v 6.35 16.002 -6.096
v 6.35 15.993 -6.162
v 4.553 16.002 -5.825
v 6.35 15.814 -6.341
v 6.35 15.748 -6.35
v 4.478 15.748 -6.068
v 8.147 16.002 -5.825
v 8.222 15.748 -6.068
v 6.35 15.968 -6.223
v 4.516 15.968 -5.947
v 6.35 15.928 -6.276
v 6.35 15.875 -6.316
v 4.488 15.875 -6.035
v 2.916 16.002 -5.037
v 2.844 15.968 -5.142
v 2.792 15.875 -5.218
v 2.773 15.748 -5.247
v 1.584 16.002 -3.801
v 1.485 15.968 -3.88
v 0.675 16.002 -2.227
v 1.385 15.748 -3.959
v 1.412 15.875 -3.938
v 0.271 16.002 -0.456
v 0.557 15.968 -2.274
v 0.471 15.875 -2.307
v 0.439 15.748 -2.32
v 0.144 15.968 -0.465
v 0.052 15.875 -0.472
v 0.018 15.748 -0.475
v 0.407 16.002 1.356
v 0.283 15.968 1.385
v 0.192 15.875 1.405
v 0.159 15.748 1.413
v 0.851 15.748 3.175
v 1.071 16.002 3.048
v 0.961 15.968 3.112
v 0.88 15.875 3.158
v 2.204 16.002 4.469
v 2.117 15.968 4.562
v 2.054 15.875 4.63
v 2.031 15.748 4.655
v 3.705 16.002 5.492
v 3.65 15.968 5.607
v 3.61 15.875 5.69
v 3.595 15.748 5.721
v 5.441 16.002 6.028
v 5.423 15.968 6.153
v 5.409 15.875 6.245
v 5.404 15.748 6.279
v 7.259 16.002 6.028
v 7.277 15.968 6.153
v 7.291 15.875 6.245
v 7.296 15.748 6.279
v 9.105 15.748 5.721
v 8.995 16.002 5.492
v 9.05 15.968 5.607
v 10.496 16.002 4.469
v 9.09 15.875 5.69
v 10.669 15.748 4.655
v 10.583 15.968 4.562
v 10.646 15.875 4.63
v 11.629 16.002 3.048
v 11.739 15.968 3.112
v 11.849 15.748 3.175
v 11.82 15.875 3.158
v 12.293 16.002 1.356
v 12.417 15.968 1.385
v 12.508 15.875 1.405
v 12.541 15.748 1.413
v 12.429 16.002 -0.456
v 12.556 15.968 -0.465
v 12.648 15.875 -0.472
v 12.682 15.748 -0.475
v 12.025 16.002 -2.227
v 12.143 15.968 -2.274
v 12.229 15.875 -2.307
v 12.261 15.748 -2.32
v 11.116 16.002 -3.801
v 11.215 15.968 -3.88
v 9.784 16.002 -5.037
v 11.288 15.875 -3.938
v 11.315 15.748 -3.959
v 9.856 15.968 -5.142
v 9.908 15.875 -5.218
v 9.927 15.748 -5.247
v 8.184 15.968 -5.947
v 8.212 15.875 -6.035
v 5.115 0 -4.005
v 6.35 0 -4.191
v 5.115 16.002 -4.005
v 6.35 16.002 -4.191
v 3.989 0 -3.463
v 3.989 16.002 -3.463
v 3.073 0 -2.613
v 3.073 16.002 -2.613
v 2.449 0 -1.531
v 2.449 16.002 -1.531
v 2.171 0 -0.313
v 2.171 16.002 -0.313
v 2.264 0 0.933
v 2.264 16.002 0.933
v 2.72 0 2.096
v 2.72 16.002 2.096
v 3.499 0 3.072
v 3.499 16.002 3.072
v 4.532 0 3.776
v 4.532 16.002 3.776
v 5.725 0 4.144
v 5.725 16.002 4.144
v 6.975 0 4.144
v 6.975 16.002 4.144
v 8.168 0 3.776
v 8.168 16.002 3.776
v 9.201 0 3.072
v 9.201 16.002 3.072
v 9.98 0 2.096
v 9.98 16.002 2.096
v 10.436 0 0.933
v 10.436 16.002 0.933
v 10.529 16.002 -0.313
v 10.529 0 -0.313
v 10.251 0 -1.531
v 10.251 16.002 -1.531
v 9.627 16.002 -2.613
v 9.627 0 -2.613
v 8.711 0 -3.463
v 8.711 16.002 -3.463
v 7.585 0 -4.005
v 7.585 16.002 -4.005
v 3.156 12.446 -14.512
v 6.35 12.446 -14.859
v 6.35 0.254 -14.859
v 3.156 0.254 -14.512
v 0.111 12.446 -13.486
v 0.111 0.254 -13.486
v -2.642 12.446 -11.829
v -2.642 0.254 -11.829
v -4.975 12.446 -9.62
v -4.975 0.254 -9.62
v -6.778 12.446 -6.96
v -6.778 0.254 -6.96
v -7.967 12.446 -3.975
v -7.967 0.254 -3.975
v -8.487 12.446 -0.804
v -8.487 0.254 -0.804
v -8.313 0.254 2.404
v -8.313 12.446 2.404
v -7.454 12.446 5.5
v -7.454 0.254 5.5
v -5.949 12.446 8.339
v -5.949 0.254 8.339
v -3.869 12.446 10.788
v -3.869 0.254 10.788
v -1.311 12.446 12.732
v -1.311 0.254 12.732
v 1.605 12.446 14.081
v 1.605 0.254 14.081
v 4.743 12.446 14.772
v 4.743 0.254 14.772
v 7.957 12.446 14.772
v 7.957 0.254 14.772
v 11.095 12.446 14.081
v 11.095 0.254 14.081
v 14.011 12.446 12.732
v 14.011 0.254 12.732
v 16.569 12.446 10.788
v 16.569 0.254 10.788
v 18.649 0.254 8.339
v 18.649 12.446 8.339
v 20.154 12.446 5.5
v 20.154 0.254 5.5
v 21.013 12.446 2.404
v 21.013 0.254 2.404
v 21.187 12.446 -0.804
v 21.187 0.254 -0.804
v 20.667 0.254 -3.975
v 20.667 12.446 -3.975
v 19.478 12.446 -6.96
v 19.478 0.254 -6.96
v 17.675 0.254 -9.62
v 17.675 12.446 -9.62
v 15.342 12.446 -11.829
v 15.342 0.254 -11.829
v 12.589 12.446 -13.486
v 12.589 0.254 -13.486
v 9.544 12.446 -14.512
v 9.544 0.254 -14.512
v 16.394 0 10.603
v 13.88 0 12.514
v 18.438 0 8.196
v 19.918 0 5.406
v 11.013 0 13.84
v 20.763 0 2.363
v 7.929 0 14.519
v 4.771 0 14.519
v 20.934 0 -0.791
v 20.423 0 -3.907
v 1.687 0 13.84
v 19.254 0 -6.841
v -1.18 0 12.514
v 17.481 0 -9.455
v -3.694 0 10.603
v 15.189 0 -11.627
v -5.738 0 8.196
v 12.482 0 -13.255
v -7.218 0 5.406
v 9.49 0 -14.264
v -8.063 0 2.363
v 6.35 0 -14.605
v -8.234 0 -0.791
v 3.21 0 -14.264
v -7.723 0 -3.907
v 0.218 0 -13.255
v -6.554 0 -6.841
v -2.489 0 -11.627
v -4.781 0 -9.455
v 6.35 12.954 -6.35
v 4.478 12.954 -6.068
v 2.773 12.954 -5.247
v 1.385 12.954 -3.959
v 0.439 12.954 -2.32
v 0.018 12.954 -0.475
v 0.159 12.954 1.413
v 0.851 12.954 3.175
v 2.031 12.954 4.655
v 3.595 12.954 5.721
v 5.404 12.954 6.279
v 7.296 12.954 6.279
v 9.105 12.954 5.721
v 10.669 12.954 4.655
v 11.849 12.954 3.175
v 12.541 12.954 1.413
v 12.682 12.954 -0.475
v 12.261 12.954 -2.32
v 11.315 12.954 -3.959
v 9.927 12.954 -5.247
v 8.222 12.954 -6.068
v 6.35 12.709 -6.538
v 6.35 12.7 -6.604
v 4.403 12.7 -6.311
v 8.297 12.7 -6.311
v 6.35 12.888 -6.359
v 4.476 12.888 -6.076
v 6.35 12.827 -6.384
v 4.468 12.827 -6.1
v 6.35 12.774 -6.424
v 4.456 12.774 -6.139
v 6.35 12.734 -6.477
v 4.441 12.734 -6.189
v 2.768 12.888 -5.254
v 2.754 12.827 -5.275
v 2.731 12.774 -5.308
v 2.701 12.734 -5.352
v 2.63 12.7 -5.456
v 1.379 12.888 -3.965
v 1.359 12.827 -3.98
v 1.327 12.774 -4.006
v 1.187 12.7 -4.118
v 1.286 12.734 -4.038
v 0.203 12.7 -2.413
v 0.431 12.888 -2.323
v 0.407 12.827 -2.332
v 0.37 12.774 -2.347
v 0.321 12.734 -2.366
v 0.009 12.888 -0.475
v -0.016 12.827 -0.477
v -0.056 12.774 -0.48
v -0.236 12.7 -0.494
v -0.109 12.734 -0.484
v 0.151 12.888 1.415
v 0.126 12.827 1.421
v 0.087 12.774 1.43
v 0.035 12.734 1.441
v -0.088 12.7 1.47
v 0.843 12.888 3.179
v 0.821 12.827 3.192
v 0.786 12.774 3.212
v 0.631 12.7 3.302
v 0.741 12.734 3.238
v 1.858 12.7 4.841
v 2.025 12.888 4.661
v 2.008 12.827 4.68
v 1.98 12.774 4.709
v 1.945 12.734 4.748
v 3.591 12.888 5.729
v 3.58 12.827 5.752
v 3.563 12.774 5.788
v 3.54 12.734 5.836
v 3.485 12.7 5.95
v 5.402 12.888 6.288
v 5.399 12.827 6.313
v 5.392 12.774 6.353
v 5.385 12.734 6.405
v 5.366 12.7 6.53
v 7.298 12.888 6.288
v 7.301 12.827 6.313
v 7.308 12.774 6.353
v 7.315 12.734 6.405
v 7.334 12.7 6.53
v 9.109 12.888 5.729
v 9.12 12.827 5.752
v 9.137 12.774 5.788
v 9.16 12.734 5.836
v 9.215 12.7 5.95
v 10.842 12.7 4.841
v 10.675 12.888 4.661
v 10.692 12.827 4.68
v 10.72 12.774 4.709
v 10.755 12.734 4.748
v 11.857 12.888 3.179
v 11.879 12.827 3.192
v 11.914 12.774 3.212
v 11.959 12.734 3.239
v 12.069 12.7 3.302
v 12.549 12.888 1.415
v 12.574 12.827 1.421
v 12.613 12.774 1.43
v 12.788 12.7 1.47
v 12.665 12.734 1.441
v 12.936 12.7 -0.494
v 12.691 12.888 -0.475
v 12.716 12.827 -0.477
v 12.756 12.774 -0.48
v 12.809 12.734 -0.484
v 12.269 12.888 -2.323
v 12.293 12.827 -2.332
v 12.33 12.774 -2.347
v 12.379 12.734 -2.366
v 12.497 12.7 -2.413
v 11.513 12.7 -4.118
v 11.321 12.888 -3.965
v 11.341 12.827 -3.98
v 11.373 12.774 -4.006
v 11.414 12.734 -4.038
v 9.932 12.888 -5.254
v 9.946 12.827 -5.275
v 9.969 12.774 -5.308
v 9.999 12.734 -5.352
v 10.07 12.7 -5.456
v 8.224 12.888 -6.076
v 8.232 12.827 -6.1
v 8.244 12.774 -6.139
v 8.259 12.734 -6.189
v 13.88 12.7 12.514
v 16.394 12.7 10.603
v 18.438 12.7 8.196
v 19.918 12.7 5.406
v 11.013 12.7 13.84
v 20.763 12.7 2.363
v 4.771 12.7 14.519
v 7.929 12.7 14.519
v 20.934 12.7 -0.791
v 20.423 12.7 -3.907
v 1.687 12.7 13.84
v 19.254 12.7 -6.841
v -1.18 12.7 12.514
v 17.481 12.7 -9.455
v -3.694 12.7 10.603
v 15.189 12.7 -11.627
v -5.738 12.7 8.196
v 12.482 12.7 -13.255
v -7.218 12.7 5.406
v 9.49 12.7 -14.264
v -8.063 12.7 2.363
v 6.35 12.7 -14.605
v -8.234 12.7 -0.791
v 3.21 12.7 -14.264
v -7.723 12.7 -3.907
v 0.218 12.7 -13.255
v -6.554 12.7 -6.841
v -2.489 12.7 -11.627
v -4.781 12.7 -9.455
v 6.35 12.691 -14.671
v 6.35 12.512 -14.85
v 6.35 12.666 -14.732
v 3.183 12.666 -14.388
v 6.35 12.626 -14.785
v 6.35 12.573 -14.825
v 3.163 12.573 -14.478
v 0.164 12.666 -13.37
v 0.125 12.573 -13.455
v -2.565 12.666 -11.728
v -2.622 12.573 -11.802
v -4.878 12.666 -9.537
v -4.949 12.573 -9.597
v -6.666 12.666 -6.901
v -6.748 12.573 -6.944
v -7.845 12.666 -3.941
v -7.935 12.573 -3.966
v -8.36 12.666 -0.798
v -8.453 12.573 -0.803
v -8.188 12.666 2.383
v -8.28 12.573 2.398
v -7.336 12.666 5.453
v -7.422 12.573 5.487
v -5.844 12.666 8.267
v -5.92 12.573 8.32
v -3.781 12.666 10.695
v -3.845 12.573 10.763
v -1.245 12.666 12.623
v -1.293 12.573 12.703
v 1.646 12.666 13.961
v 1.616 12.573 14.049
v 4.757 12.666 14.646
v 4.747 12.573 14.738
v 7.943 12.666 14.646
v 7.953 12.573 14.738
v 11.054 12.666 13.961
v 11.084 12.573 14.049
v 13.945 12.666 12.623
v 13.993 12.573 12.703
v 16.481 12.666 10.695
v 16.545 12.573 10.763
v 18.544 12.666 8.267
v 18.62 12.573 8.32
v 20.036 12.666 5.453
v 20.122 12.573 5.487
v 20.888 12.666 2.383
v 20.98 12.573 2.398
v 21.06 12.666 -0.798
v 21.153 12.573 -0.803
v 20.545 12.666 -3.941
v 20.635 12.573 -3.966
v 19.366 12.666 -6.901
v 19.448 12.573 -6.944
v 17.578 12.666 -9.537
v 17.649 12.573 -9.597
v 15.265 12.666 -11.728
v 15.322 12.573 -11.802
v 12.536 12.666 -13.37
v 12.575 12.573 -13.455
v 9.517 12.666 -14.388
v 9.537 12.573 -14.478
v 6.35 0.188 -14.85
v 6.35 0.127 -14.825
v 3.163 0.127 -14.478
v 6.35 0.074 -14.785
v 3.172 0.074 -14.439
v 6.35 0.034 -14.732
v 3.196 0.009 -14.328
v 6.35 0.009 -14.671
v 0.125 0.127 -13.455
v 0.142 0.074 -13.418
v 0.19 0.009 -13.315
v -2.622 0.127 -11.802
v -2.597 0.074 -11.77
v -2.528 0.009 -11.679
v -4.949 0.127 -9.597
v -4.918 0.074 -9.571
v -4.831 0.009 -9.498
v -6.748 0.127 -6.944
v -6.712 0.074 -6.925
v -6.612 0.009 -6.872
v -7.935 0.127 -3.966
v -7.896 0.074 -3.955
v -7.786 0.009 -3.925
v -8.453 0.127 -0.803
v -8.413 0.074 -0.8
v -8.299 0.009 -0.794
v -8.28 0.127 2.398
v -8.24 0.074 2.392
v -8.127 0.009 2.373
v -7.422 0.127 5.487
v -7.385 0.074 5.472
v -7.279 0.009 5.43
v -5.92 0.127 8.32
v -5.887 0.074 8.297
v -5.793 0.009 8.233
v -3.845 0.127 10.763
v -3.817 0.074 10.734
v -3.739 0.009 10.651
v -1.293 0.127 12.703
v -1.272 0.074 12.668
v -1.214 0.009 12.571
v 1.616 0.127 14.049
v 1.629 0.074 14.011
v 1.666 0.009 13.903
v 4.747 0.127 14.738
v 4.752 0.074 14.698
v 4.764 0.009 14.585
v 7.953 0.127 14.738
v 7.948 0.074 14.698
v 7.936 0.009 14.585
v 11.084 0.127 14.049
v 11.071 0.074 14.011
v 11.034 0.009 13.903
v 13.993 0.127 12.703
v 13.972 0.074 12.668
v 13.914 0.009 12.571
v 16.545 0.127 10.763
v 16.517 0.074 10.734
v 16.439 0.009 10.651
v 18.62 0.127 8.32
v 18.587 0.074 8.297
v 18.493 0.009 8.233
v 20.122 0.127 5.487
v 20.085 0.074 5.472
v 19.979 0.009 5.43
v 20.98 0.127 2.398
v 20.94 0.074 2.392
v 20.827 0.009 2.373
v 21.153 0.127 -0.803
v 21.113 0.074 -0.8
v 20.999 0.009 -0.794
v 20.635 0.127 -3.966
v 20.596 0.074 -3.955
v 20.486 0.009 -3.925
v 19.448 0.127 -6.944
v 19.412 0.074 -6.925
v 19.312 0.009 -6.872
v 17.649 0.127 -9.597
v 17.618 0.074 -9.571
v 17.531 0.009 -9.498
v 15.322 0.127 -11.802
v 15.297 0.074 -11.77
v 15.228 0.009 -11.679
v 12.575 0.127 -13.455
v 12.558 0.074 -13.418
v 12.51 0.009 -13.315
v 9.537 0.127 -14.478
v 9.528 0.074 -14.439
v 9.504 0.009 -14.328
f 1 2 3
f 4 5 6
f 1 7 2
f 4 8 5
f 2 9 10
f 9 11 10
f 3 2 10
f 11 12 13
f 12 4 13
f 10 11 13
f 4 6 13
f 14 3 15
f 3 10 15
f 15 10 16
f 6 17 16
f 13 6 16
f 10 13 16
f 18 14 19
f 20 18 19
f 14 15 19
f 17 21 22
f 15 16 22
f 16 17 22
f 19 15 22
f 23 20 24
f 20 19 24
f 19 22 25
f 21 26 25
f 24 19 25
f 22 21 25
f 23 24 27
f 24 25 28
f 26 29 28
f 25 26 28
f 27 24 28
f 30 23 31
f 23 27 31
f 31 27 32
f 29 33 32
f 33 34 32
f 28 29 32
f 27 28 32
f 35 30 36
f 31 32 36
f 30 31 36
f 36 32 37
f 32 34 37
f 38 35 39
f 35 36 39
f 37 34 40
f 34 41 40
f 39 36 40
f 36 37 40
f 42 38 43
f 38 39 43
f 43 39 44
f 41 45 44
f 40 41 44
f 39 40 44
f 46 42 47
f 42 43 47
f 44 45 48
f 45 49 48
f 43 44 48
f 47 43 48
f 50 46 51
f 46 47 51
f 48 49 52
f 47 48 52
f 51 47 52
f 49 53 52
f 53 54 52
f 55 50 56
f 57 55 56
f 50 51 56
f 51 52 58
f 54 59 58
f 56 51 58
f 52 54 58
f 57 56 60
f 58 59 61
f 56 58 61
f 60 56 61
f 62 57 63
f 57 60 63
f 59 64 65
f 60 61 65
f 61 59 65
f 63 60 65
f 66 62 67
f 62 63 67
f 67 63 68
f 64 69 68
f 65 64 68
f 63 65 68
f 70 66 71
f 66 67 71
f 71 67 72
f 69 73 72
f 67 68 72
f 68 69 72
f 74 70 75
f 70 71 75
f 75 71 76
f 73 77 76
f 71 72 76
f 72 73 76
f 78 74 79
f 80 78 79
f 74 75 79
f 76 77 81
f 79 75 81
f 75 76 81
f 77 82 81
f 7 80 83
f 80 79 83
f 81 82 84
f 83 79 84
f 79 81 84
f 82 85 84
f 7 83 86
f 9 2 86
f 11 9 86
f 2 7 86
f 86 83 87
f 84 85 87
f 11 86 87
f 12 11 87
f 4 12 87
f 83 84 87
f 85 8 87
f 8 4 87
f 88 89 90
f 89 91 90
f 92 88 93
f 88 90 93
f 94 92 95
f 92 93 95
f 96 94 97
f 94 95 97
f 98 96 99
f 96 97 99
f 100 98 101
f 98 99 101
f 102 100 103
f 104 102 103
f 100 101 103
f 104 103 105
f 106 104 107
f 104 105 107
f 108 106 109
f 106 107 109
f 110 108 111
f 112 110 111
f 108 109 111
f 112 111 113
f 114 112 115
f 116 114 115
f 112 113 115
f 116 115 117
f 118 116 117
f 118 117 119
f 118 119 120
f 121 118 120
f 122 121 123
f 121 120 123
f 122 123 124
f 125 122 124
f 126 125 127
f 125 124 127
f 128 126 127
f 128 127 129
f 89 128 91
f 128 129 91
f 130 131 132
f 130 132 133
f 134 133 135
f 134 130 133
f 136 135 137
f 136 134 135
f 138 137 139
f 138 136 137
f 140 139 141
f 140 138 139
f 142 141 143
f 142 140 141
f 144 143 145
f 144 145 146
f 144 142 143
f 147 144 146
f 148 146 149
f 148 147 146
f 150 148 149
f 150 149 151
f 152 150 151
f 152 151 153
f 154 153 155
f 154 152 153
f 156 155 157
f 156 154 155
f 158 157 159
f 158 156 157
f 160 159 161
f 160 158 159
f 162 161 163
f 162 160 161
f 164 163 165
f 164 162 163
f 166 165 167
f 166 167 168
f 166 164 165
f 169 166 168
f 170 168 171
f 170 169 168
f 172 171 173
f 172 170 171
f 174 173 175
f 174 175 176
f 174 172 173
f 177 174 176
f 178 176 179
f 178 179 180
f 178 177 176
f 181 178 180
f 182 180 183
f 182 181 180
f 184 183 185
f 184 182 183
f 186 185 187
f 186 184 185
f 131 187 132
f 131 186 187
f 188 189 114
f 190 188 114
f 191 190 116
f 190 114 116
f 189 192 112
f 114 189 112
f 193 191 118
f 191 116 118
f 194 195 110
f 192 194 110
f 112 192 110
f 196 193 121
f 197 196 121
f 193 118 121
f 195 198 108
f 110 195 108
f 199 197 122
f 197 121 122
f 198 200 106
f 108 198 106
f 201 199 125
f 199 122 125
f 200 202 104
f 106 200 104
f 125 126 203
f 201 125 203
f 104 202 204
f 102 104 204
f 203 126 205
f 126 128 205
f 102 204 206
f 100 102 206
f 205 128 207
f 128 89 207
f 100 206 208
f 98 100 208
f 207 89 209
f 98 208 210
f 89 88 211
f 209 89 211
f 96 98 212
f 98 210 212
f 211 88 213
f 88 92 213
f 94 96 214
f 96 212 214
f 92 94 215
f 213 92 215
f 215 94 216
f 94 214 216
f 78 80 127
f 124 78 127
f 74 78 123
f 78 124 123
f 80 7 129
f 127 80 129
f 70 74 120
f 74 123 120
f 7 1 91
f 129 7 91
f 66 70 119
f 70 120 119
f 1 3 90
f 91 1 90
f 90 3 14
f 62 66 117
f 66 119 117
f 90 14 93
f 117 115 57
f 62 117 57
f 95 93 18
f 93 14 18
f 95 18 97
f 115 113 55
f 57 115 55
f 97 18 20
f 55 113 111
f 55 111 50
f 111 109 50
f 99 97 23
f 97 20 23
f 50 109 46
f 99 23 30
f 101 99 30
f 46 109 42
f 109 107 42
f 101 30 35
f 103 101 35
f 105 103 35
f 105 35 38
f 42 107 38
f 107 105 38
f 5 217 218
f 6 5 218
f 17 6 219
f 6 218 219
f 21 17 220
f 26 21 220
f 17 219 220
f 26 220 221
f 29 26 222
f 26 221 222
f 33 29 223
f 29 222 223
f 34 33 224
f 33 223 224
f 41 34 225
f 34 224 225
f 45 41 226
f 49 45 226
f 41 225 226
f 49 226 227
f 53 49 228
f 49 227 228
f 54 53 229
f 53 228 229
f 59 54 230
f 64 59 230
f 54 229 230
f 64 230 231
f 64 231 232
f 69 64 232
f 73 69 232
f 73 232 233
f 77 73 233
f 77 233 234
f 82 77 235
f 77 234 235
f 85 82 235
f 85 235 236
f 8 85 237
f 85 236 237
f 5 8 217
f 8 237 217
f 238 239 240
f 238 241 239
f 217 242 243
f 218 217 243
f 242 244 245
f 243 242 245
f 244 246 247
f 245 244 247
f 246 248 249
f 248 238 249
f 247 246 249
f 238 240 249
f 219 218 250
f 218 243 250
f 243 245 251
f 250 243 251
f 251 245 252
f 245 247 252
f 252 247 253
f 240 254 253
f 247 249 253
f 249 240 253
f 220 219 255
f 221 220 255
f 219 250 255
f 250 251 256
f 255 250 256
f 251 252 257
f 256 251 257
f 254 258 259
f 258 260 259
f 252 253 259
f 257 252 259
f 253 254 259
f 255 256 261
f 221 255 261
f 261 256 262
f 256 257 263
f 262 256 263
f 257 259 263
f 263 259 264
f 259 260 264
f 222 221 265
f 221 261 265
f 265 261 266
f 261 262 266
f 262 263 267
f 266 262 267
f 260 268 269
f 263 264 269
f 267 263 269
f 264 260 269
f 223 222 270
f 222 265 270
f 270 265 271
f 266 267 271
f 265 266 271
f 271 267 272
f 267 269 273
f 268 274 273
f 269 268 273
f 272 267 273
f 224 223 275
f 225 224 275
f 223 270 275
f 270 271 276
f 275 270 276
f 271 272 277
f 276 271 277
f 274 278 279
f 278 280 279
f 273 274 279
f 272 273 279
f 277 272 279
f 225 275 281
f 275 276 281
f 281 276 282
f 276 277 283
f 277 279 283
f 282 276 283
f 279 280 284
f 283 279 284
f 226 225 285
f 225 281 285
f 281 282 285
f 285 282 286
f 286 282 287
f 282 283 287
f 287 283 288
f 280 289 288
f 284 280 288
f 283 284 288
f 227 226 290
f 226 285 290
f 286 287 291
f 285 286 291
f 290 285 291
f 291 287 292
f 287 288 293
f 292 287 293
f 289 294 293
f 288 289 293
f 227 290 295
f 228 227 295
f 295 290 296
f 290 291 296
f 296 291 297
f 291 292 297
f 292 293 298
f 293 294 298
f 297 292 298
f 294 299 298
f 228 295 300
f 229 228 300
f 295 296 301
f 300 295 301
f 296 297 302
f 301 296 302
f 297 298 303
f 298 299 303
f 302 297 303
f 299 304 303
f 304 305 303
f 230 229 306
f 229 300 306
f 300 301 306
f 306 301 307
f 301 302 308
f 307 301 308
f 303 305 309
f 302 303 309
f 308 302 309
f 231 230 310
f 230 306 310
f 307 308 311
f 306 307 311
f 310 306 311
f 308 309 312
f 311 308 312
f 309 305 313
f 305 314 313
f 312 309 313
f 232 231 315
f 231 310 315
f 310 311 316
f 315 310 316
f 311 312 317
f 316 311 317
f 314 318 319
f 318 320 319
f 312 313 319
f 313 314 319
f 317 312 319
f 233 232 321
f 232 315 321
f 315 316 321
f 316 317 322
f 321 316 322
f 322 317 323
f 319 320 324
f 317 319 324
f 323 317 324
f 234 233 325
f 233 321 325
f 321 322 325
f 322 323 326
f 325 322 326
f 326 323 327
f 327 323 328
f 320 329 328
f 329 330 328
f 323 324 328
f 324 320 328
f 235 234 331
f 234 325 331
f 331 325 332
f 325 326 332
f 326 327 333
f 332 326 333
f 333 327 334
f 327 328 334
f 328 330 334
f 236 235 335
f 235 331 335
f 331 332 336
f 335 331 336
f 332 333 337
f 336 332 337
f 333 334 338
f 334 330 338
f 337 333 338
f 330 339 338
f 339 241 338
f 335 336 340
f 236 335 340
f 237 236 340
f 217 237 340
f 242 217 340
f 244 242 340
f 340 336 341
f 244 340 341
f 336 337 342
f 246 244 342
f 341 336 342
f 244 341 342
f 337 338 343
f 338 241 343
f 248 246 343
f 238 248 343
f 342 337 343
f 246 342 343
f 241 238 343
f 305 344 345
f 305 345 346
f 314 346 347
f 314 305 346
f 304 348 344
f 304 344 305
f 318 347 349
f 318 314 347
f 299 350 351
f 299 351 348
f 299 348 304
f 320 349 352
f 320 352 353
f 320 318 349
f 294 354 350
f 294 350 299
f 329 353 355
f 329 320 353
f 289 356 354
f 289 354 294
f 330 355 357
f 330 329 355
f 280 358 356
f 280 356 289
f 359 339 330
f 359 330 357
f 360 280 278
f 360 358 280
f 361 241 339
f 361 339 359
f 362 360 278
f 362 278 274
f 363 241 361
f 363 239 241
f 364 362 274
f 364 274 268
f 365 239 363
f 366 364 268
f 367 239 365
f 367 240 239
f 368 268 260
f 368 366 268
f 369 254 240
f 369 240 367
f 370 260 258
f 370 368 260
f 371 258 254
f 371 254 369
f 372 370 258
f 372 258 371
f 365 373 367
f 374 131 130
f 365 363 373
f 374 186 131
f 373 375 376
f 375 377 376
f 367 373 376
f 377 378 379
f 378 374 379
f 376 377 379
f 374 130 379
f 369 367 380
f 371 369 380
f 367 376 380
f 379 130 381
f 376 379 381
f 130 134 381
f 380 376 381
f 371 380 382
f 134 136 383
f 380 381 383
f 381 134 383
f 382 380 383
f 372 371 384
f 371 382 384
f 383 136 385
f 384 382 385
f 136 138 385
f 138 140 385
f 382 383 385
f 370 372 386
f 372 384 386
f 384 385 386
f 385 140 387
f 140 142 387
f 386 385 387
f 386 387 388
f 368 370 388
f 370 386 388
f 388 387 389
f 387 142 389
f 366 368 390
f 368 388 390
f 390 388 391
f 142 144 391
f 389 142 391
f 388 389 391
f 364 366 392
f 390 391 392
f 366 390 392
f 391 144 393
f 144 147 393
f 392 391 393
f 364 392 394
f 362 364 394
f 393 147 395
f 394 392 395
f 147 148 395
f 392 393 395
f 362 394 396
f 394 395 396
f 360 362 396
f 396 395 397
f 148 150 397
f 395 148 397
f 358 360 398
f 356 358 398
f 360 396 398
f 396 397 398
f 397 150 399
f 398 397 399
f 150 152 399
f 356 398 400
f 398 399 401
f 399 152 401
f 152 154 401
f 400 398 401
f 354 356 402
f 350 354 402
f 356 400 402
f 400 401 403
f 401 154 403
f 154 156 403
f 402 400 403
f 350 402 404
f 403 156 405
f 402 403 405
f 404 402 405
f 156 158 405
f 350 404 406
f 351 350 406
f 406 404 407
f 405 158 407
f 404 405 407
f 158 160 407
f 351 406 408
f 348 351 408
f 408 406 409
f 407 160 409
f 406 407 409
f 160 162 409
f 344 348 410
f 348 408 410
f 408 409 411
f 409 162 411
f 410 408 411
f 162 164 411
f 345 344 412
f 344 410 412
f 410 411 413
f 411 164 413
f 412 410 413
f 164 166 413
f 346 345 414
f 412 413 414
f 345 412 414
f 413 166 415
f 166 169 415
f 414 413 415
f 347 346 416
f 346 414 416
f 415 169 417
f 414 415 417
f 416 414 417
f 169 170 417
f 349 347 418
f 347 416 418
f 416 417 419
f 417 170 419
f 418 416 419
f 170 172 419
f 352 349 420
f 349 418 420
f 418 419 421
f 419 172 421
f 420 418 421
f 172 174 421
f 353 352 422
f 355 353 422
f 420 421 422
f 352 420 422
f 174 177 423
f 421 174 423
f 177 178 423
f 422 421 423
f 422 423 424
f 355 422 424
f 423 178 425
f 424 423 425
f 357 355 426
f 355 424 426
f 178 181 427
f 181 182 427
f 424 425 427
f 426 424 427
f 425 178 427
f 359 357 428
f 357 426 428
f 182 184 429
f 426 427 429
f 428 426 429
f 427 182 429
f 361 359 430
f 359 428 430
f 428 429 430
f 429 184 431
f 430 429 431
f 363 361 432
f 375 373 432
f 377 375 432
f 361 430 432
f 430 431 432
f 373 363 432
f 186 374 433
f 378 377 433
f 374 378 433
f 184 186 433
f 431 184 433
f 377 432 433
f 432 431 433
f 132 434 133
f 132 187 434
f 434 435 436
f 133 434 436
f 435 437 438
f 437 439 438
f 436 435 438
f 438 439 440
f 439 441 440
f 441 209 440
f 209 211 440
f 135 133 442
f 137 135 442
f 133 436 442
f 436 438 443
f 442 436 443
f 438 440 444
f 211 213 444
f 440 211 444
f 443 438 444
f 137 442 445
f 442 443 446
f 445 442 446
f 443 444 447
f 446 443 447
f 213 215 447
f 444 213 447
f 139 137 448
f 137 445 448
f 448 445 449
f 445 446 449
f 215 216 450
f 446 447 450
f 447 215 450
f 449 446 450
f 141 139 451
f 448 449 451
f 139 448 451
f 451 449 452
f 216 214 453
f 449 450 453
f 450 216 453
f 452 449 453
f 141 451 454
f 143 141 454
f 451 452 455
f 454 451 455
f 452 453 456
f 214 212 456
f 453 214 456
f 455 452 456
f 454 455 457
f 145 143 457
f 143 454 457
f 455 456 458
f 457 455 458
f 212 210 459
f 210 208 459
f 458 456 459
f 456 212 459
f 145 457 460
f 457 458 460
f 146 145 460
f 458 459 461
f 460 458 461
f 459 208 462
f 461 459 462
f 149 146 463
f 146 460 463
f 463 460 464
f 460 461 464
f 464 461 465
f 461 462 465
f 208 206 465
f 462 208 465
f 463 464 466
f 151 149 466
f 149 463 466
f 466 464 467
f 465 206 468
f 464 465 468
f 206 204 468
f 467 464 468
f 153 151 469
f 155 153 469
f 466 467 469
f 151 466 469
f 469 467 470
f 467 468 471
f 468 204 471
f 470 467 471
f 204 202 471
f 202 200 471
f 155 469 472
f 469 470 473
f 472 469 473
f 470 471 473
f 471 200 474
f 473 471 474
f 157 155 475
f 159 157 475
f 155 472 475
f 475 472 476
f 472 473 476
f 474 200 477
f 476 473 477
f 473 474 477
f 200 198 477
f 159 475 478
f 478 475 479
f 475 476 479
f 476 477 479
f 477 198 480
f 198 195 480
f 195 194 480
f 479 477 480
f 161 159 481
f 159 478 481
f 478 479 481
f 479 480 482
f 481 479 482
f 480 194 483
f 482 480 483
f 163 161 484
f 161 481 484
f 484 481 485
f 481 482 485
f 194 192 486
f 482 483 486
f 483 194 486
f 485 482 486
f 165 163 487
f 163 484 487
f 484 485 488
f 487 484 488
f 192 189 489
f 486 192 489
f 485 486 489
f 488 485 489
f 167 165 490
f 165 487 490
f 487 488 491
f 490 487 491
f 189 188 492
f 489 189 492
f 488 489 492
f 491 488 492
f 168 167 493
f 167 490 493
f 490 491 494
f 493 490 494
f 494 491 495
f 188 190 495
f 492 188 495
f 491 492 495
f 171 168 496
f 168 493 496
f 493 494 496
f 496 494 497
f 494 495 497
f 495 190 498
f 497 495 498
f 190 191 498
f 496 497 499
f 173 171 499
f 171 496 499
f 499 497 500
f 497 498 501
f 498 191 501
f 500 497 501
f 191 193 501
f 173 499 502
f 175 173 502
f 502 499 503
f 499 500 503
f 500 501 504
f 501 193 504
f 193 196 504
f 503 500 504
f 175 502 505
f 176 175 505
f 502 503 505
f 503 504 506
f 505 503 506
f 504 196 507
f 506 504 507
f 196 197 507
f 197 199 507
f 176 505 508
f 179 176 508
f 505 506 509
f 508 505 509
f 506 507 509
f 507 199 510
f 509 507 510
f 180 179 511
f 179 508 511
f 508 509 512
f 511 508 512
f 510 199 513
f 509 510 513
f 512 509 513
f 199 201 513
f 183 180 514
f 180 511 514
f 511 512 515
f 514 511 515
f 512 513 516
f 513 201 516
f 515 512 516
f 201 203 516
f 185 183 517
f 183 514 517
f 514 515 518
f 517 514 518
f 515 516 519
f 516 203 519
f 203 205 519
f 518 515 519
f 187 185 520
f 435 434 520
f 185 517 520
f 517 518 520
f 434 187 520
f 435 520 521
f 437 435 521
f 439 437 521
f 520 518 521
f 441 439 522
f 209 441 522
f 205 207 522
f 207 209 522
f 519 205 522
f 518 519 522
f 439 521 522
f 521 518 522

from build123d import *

# Parameters (mm, degrees)
FILLET2_R = 0.254


with BuildPart() as part:
    # Sketch1 → Revolve1 (revolve)
    with BuildSketch(Plane.XY):
        Polygon((2.159, 0), (2.159, 16.002), (0, 16.002), (0, 12.7), (-8.509, 12.7), (-8.509, 0), align=None)
    revolve(axis=Axis((6.35, 0, 0), (0, 1, 0)))

    # Fillet2
    fillet2_edges = [part.edges().sort_by_distance(p)[0] for p in [
        (21.209, 0, 0),
        (21.209, 12.7, 0),
        (12.7, 12.7, 0),
        (12.7, 16.002, 0),
    ]]
    fillet(fillet2_edges, radius=FILLET2_R)


solid = part.part
